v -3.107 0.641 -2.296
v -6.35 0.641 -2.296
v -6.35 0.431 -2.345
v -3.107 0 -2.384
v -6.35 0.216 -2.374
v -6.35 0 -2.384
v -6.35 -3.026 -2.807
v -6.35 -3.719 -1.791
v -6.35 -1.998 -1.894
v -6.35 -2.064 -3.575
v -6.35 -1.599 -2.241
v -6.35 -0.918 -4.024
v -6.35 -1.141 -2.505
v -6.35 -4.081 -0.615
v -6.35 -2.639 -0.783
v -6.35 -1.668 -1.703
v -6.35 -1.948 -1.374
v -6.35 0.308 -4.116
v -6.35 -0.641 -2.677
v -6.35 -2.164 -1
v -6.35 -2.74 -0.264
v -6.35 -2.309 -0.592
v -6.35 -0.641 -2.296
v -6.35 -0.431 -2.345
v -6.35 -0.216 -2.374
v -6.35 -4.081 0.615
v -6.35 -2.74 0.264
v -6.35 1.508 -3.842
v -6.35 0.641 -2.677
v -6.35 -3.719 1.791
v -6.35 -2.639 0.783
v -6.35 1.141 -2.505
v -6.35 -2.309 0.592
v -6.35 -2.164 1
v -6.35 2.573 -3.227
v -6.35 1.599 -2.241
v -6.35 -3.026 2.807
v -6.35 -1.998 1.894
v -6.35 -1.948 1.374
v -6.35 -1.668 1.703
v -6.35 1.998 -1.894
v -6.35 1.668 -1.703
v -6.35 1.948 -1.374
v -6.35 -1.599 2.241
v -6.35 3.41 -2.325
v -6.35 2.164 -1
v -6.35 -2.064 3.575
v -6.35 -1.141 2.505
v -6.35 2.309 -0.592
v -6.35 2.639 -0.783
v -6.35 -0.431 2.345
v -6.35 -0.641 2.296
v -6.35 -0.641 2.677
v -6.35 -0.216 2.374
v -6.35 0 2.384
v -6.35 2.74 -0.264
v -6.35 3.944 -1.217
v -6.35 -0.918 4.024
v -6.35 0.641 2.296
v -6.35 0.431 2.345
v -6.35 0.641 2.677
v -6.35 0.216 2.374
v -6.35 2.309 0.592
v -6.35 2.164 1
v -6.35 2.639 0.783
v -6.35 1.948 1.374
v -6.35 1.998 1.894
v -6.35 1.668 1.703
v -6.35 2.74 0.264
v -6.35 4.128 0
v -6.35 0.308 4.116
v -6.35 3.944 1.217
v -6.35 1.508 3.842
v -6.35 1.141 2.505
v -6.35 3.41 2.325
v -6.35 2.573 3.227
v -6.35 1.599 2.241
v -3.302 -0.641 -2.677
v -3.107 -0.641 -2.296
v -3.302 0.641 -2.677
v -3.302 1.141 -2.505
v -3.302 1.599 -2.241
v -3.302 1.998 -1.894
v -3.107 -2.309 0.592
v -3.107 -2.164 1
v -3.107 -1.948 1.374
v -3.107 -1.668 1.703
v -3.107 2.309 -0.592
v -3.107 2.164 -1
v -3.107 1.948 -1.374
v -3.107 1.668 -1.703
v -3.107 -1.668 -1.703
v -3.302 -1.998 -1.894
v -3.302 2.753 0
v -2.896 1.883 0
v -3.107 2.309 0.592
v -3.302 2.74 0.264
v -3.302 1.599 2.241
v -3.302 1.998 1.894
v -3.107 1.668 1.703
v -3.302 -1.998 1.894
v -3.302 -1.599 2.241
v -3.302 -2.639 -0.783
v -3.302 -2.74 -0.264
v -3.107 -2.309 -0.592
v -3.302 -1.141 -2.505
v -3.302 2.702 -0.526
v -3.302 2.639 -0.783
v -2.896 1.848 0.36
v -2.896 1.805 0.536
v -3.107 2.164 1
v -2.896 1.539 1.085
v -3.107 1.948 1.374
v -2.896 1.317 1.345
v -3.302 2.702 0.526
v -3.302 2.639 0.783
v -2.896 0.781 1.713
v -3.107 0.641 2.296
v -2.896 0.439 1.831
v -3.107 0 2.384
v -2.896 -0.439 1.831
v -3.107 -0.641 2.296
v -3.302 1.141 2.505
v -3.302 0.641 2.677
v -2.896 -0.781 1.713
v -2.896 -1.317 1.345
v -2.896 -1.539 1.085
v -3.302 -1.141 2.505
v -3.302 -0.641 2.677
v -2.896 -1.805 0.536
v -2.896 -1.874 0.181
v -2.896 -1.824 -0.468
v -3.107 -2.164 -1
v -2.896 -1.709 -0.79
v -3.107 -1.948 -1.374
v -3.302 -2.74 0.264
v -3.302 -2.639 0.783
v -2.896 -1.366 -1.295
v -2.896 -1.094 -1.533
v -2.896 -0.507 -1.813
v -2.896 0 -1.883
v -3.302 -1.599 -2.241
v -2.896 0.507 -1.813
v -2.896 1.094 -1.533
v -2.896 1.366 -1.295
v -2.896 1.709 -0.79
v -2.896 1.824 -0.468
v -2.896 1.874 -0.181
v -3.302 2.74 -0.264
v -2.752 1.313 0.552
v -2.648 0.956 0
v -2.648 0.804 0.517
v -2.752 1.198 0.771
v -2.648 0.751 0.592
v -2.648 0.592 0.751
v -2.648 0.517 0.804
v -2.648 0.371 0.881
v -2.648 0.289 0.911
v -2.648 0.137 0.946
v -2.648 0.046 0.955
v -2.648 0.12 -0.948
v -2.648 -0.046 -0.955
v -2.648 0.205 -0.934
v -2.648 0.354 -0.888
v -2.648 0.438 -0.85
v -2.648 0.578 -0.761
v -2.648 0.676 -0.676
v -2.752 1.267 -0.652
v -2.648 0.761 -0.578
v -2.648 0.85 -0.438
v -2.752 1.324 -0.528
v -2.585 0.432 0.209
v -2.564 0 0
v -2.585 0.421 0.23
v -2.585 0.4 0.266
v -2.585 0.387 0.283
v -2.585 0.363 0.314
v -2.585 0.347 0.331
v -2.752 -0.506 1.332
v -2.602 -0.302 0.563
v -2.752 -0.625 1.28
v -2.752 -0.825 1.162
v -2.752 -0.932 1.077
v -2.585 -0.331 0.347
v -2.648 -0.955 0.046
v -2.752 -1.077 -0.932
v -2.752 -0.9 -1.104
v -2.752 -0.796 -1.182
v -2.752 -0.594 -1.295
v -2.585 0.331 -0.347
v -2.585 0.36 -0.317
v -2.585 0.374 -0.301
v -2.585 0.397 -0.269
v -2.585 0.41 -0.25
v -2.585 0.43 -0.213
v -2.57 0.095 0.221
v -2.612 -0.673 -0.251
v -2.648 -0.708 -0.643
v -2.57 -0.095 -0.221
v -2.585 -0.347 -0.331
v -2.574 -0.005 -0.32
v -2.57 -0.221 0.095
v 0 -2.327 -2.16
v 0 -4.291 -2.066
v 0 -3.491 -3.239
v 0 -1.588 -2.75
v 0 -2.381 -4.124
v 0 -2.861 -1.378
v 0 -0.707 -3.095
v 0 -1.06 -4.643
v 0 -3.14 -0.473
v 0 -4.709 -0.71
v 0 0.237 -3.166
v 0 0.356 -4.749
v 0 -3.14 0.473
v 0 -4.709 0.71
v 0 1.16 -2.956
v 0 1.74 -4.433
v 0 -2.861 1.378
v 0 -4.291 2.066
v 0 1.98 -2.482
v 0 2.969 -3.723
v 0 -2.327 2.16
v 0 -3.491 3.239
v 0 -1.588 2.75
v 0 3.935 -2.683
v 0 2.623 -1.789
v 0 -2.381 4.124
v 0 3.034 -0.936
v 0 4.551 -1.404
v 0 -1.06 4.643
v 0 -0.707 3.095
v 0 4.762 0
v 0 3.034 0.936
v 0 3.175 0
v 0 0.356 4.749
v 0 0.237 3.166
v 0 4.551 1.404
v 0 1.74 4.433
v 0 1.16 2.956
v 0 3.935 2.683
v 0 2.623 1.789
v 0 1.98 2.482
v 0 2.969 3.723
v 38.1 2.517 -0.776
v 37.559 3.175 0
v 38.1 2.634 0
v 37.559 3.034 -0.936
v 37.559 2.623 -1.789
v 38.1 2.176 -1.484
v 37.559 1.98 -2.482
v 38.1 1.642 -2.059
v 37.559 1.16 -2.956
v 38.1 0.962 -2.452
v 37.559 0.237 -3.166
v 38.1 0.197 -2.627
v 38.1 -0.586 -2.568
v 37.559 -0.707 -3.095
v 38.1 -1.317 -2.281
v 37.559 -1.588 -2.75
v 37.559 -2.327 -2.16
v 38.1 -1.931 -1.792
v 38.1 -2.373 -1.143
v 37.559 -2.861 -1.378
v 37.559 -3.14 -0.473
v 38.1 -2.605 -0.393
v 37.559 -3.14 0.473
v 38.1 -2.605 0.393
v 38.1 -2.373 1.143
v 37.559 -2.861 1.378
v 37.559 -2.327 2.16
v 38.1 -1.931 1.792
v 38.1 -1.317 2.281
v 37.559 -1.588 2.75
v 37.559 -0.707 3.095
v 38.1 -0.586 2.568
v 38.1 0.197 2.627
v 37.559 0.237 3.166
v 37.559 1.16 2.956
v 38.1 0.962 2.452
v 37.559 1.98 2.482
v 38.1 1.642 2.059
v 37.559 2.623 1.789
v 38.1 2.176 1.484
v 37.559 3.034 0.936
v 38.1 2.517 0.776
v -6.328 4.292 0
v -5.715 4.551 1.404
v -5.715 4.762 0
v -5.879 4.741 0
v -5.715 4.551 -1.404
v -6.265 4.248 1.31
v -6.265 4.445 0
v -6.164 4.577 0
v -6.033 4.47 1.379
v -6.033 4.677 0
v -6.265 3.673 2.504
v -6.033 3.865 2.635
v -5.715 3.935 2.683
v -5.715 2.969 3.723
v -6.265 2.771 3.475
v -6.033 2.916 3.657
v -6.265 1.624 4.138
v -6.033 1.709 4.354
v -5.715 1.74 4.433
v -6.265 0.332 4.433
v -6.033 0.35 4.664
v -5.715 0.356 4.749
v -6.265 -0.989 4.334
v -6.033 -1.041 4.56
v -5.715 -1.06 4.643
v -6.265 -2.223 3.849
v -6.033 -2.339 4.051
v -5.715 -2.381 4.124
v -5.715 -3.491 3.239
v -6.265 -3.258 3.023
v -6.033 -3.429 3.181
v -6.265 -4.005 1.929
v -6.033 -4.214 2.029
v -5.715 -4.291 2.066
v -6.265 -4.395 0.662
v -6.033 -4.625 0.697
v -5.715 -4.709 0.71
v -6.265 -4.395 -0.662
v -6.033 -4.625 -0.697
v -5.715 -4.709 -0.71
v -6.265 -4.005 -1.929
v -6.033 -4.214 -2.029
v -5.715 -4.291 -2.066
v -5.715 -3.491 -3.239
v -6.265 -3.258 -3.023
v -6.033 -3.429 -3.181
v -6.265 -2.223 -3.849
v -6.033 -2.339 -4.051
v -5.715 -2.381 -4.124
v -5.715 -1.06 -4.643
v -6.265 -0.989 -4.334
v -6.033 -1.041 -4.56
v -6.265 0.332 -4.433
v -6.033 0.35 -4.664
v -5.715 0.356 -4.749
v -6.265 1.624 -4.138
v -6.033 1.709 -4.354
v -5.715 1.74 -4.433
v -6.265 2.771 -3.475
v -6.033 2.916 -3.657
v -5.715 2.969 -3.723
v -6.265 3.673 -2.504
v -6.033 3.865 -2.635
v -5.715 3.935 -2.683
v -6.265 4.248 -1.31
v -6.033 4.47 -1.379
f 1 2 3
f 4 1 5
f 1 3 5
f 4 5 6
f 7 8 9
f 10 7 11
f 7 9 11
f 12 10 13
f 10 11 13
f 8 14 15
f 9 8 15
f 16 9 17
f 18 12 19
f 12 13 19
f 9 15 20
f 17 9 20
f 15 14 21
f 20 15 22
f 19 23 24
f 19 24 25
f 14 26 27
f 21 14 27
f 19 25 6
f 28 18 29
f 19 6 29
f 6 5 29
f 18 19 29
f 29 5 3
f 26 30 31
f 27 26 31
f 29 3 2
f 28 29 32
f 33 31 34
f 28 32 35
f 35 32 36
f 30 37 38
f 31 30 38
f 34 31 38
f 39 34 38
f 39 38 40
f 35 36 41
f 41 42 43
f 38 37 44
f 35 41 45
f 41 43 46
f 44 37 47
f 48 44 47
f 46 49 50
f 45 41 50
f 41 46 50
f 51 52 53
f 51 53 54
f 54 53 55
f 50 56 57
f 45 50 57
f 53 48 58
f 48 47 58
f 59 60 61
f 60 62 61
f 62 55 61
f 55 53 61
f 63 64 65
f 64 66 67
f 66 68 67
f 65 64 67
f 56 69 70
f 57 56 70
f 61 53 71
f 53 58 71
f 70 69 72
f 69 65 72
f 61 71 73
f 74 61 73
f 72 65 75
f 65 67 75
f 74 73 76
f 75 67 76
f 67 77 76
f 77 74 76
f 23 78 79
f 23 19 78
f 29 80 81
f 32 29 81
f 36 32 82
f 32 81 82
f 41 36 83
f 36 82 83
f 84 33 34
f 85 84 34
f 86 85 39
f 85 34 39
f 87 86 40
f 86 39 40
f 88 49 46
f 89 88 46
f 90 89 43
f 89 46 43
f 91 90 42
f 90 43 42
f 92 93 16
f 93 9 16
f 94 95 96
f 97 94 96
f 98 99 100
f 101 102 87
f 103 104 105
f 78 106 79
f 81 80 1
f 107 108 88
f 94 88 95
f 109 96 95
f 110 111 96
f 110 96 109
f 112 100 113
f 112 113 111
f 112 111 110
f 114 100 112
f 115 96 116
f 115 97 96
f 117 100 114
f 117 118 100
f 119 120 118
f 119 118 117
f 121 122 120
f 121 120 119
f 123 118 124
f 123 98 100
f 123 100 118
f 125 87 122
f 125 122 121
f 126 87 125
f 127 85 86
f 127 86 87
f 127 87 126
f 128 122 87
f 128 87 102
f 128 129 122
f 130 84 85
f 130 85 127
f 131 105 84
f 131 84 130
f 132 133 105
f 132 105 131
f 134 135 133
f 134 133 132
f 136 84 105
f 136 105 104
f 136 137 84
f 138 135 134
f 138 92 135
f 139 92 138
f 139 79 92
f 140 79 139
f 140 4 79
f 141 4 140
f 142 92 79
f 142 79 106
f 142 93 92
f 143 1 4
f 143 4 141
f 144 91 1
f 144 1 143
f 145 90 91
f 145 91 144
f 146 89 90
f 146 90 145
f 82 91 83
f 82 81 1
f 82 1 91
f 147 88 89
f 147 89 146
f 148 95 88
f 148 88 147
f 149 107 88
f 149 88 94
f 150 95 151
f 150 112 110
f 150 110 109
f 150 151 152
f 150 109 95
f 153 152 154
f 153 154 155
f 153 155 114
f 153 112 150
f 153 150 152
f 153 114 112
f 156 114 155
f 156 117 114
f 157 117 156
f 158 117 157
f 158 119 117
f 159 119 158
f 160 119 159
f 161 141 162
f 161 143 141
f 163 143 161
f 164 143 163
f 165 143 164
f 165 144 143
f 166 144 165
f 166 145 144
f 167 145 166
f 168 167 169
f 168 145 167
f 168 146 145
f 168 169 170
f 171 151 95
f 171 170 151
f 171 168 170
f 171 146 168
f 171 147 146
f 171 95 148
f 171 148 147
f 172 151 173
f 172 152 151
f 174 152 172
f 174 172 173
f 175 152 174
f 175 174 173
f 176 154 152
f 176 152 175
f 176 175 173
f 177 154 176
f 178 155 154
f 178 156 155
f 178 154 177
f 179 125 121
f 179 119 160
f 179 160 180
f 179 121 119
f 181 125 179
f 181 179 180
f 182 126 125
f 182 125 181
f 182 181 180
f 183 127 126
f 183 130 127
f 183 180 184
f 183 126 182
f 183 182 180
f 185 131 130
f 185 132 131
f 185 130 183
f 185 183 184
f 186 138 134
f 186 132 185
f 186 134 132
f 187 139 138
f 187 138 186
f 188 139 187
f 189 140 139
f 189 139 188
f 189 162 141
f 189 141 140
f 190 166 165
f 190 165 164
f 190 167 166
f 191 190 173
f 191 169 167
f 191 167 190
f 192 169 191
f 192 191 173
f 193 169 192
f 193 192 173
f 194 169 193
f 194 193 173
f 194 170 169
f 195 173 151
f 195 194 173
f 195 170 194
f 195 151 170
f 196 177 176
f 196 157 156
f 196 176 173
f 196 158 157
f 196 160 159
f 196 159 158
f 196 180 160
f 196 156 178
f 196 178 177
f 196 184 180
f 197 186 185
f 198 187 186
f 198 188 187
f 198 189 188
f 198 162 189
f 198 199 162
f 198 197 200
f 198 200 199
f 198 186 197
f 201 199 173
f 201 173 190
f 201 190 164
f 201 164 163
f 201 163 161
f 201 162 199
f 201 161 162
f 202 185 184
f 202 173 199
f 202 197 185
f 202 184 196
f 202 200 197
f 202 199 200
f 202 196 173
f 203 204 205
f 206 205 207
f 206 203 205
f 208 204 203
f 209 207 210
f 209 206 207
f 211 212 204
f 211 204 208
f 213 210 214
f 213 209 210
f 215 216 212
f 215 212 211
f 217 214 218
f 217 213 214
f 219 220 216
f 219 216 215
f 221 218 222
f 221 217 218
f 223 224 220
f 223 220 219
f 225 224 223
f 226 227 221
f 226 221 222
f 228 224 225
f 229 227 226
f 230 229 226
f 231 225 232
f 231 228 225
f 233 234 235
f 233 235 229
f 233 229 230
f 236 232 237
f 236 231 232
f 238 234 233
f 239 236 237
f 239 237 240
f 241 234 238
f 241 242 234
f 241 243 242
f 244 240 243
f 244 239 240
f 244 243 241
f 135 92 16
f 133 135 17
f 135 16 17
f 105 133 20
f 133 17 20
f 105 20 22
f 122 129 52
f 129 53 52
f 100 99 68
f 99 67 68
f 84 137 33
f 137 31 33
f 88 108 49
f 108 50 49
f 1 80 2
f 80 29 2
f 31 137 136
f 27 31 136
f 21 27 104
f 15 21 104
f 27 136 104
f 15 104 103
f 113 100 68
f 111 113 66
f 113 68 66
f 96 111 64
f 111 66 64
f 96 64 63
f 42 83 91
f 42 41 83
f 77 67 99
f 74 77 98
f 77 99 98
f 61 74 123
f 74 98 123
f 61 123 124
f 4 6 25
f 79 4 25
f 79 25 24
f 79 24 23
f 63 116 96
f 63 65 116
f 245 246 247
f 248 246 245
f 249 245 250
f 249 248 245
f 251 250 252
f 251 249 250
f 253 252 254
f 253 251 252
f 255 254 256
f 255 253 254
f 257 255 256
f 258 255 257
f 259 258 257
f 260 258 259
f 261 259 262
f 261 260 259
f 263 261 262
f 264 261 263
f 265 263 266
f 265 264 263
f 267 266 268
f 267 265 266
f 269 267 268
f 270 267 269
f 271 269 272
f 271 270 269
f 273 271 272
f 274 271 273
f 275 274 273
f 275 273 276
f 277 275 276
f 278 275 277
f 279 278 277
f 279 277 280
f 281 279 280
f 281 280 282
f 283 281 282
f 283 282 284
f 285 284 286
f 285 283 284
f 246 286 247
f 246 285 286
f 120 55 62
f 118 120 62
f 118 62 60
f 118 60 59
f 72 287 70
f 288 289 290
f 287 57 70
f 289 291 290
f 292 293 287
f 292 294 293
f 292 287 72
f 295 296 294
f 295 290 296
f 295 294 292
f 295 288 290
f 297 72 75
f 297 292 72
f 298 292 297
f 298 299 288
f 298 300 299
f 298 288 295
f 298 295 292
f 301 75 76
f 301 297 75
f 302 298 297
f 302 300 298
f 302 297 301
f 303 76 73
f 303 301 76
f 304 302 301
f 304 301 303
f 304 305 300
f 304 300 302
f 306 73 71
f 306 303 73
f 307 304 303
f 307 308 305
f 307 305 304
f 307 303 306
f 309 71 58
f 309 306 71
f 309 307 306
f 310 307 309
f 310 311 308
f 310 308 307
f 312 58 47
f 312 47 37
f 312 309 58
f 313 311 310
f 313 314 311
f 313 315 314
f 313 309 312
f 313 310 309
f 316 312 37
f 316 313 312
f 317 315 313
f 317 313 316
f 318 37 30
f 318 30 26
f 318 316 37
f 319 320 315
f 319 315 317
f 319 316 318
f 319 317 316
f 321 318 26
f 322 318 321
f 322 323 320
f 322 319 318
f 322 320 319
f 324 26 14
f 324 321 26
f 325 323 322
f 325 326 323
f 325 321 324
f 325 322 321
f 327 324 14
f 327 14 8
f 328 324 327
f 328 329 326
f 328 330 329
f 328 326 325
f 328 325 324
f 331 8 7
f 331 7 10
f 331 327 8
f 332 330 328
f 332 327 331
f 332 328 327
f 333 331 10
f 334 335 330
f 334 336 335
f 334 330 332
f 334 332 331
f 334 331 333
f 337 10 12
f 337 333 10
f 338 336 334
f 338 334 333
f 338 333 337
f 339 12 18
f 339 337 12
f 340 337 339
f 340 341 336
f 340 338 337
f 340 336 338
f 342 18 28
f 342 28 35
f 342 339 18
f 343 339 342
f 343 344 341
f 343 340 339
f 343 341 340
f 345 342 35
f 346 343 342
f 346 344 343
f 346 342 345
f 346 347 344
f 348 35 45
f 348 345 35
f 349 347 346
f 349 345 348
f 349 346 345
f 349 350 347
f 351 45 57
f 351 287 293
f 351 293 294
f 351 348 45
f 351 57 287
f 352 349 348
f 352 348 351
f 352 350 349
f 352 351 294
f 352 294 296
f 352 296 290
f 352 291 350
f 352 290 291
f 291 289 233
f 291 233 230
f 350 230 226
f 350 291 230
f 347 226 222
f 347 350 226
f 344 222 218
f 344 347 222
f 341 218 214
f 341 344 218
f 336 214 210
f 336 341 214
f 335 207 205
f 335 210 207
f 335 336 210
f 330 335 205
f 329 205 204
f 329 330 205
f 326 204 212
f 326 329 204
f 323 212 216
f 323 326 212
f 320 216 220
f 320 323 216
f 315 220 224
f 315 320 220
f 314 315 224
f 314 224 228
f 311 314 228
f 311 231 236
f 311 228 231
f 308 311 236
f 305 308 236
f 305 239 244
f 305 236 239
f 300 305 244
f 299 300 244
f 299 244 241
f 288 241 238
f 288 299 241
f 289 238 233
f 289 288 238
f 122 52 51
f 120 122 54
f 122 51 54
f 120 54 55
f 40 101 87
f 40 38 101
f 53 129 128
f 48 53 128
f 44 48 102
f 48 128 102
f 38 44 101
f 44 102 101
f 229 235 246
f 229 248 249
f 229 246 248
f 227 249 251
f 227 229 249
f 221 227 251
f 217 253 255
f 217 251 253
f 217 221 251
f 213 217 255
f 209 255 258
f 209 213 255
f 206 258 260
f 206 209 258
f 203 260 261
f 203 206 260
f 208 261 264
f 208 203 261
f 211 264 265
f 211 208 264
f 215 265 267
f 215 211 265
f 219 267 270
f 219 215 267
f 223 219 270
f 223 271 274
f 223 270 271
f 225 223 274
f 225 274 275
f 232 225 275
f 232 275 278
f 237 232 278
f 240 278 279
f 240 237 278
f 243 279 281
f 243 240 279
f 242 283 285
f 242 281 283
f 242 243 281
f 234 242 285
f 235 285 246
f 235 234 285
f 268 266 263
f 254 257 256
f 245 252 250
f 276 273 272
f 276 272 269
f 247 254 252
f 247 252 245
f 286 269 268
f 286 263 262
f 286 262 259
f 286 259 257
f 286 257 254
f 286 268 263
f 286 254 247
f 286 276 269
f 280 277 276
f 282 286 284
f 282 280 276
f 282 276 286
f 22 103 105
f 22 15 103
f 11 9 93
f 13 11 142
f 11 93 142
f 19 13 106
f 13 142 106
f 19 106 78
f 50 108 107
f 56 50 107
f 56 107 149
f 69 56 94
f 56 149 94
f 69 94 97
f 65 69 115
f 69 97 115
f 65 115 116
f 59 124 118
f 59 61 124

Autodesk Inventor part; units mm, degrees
ref_plane "YZ Plane" through (0, 0, 0) normal (1, 0, 0) x (0, 1, 0)
sketch "Sketch1" plane through (0, 0, 0) normal (0, 0, 1) x (1, 0, 0)
  line L0 (-6.35, 0) -> (38.1, 0)
  line L1 (38.1, 0) -> (38.1, 3.175)
  line L2 (38.1, 3.175) -> (0, 3.175)
  line L3 (0, 3.175) -> (0, 4.7625)
  line L4 (-17.3035, 0) -> (47.3339, 0) projected
  line L5 (0, -0.9525) -> (0, 5.715) projected
  line L6 (0, 4.7625) -> (-6.35, 4.7625)
  line L7 (-6.35, 0) -> (-6.35, 4.7625)
  arc A0 (-2.5645, 0) -> (-3.302, 2.7526) centre (-8.0696, 0) ccw
  line L8 (-6.35, 2.7526) -> (-3.302, 2.7526)
  line L9 (12.7, 3.175) -> (0, 3.175) construction
  dimension "d0" = 38.1
  dimension "d1" = 6.35
  dimension "d2" = 6.35
  dimension "d5" = 9.525
  dimension "d13" = 5.5051
  dimension "d14" = 5.5051
  dimension "d15" = 3.048
revolve "Body" add sketch "Sketch1" angle 360 about axis through (-6.35, 0, 0) along (1, 0, 0) contours A0 L8 L7 L6 L3 L5 L0 | L5 L2 L1 L0
ref_plane "IDS_WORKPLANE{1}" through (-6.35, 0, 0) normal (1, 0, 0) x (0, 0, -1)
sketch "Sketch2" plane through (-6.35, 0, 0) normal (1, 0, 0) x (0, 0, -1)
  line L0 (0, -6.6675) -> (0, 6.6675) projected
  line L1 (6.6675, 0) -> (-6.6675, 0) projected
  circle A0 centre (0, 0) radius 4.7625 projected
  line L2 (2.6768, 0.6414) -> (2.2959, 0.6414)
  line L3 (0, 0) -> (2.6768, 0.6414) construction
  line L4 (0, 0) -> (4.0727, 3.8613) construction
  line L5 (0, 0) -> (0.783, 2.6389) construction
  line L6 (0, 0) -> (1.3763, 2.3838) construction
  line L7 (0.783, 2.6389) -> (0.5925, 2.309)
  line L8 (1.8938, 1.9975) -> (1.7034, 1.6676)
  line L9 (0, 0) -> (1.8938, 1.9975) construction
  arc A1 (2.3838, 0) -> (2.2959, 0.6414) centre (0, 0) ccw
  arc A2 (1.7034, 1.6676) -> (0.5925, 2.309) centre (0, 0) ccw
  arc A3 (2.7526, 0) -> (2.6768, 0.6414) centre (0, 0) ccw
  arc A4 (1.8938, 1.9975) -> (0.783, 2.6389) centre (0, 0) ccw
  arc A5 (2.6768, 0.6414) -> (1.6232, 2.223) centre (0, 0) ccw construction
  arc A6 (2.2959, 0.6414) -> (1.7034, 1.6676) centre (0, 0) ccw construction
  line L10 (2.6768, -0.6414) -> (2.2959, -0.6414)
  line L11 (0.783, -2.6389) -> (0.5925, -2.309)
  line L12 (1.8938, -1.9975) -> (1.7034, -1.6676)
  arc A7 (2.2959, -0.6414) -> (2.3838, 0) centre (0, 0) ccw
  arc A8 (0.5925, -2.309) -> (1.7034, -1.6676) centre (0, 0) ccw
  arc A9 (2.6768, -0.6414) -> (2.7526, 0) centre (0, 0) ccw
  arc A10 (0.783, -2.6389) -> (1.8938, -1.9975) centre (0, 0) ccw
  line L13 (-2.6768, 0.6414) -> (-2.2959, 0.6414)
  line L14 (-0.783, 2.6389) -> (-0.5925, 2.309)
  line L15 (-1.8938, 1.9975) -> (-1.7034, 1.6676)
  arc A11 (-2.2959, 0.6414) -> (-2.3838, 0) centre (0, 0) ccw
  arc A12 (-0.5925, 2.309) -> (-1.7034, 1.6676) centre (0, 0) ccw
  arc A13 (-2.6768, 0.6414) -> (-2.7526, 0) centre (0, 0) ccw
  arc A14 (-0.783, 2.6389) -> (-1.8938, 1.9975) centre (0, 0) ccw
  line L16 (-0.783, -2.6389) -> (-0.5925, -2.309)
  arc A15 (-1.7034, -1.6676) -> (-0.5925, -2.309) centre (0, 0) ccw
  line L17 (-1.8938, -1.9975) -> (-1.7034, -1.6676)
  arc A16 (-1.8938, -1.9975) -> (-0.783, -2.6389) centre (0, 0) ccw
  arc A17 (-2.3838, 0) -> (-2.2959, -0.6414) centre (0, 0) ccw
  line L18 (-2.6768, -0.6414) -> (-2.2959, -0.6414)
  arc A18 (-2.7526, 0) -> (-2.6768, -0.6414) centre (0, 0) ccw
  point P0 (1.3763, -2.3838)
  point P1 (-1.3763, 2.3838)
  point P2 (-1.3763, -2.3838)
  dimension "d19" = 0.6413
  dimension "d20" = 1.2827
  dimension "d21" = 33.052
  dimension "d22" = 5.5051
  dimension "d23" = 4.7676
extrude "Slot" add sketch "Sketch2" along normal up to next contours A1 L2 A3 L1 | L1 A9 L10 A7 | A17 L18 A18 L1 | L1 A13 L13 A11 | A4 L8 A2 L7 | L11 A8 L12 A10 | L14 A12 L15 A14 | A16 L17 A15 L16
fillet "Fillet1" radius 0.635 1 edges at (-6.35, -4.7625, 0)
thread "Thread" size "1/4-28 UNF" class "2A" standard "ANSI Unified Screw Threads" length 25.4
chamfer "Chamfer1" distance 0.541 distance2 0.541 1 edges at (38.1, -3.175, 0) measured on face at (38.1, -0.6107, -1.4381)
ref_plane "Work Plane2" through (-3.175, 0, 0) normal (0, 0, -1) x (1, 0, 0)
equation "\"d19\" = 0.5 * SBR"
equation "\"d20\" = SBR"
equation "\"d22\" = 1.1547 * SW"
equation "\"d23\" = SW"
equation "\"d17\" = INTI"
equation "\"d24\" = RR"
equation "\"d6\" = GEL"
equation "\"d9\" = -0.5 * SPD + 0.5 * NND"
equation "\"d10\" = GUL"
equation "\"d0\" = NLG"
equation "\"d1\" = KOH"
equation "\"d2\" = NND"
equation "\"d5\" = KOD"
equation "\"d13\" = 1.1547 * SW"
equation "\"d14\" = 1.1547 * SW"
equation "\"d15\" = INTI"
equation "\"NND\" = 6.35"
equation "\"NLG\" = 38.1"
equation "\"GEL\" = 25.4"
equation "\"KOD\" = 9.525"
equation "\"KOH\" = 6.35"
equation "\"SPD\" = GD1"
equation "\"GUL\" = 0.54102"
equation "\"SBR\" = 1.2827"
equation "\"INTI\" = 3.048"
equation "\"d11\" = -KOH"
equation "\"SW\" = 4.76758"
equation "\"d16\" = 1.1547 * SW"
equation "\"d18\" = SW"
equation "\"RR\" = 0.635"
equation "\"TOA\" = 30deg"
equation "\"GD1\" = 5.26796"
equation "\"THREADDIA\" = 6.35"
equation "\"BDM\" = NND"
equation "\"GD\" = NND"
equation "\"GAL\" = 1.36068"
equation "\"E0\" = 5.55498"
properties part number "ANSI B18.3 - 1/4-28 UNF - 1.5" material "Steel, Mild"
